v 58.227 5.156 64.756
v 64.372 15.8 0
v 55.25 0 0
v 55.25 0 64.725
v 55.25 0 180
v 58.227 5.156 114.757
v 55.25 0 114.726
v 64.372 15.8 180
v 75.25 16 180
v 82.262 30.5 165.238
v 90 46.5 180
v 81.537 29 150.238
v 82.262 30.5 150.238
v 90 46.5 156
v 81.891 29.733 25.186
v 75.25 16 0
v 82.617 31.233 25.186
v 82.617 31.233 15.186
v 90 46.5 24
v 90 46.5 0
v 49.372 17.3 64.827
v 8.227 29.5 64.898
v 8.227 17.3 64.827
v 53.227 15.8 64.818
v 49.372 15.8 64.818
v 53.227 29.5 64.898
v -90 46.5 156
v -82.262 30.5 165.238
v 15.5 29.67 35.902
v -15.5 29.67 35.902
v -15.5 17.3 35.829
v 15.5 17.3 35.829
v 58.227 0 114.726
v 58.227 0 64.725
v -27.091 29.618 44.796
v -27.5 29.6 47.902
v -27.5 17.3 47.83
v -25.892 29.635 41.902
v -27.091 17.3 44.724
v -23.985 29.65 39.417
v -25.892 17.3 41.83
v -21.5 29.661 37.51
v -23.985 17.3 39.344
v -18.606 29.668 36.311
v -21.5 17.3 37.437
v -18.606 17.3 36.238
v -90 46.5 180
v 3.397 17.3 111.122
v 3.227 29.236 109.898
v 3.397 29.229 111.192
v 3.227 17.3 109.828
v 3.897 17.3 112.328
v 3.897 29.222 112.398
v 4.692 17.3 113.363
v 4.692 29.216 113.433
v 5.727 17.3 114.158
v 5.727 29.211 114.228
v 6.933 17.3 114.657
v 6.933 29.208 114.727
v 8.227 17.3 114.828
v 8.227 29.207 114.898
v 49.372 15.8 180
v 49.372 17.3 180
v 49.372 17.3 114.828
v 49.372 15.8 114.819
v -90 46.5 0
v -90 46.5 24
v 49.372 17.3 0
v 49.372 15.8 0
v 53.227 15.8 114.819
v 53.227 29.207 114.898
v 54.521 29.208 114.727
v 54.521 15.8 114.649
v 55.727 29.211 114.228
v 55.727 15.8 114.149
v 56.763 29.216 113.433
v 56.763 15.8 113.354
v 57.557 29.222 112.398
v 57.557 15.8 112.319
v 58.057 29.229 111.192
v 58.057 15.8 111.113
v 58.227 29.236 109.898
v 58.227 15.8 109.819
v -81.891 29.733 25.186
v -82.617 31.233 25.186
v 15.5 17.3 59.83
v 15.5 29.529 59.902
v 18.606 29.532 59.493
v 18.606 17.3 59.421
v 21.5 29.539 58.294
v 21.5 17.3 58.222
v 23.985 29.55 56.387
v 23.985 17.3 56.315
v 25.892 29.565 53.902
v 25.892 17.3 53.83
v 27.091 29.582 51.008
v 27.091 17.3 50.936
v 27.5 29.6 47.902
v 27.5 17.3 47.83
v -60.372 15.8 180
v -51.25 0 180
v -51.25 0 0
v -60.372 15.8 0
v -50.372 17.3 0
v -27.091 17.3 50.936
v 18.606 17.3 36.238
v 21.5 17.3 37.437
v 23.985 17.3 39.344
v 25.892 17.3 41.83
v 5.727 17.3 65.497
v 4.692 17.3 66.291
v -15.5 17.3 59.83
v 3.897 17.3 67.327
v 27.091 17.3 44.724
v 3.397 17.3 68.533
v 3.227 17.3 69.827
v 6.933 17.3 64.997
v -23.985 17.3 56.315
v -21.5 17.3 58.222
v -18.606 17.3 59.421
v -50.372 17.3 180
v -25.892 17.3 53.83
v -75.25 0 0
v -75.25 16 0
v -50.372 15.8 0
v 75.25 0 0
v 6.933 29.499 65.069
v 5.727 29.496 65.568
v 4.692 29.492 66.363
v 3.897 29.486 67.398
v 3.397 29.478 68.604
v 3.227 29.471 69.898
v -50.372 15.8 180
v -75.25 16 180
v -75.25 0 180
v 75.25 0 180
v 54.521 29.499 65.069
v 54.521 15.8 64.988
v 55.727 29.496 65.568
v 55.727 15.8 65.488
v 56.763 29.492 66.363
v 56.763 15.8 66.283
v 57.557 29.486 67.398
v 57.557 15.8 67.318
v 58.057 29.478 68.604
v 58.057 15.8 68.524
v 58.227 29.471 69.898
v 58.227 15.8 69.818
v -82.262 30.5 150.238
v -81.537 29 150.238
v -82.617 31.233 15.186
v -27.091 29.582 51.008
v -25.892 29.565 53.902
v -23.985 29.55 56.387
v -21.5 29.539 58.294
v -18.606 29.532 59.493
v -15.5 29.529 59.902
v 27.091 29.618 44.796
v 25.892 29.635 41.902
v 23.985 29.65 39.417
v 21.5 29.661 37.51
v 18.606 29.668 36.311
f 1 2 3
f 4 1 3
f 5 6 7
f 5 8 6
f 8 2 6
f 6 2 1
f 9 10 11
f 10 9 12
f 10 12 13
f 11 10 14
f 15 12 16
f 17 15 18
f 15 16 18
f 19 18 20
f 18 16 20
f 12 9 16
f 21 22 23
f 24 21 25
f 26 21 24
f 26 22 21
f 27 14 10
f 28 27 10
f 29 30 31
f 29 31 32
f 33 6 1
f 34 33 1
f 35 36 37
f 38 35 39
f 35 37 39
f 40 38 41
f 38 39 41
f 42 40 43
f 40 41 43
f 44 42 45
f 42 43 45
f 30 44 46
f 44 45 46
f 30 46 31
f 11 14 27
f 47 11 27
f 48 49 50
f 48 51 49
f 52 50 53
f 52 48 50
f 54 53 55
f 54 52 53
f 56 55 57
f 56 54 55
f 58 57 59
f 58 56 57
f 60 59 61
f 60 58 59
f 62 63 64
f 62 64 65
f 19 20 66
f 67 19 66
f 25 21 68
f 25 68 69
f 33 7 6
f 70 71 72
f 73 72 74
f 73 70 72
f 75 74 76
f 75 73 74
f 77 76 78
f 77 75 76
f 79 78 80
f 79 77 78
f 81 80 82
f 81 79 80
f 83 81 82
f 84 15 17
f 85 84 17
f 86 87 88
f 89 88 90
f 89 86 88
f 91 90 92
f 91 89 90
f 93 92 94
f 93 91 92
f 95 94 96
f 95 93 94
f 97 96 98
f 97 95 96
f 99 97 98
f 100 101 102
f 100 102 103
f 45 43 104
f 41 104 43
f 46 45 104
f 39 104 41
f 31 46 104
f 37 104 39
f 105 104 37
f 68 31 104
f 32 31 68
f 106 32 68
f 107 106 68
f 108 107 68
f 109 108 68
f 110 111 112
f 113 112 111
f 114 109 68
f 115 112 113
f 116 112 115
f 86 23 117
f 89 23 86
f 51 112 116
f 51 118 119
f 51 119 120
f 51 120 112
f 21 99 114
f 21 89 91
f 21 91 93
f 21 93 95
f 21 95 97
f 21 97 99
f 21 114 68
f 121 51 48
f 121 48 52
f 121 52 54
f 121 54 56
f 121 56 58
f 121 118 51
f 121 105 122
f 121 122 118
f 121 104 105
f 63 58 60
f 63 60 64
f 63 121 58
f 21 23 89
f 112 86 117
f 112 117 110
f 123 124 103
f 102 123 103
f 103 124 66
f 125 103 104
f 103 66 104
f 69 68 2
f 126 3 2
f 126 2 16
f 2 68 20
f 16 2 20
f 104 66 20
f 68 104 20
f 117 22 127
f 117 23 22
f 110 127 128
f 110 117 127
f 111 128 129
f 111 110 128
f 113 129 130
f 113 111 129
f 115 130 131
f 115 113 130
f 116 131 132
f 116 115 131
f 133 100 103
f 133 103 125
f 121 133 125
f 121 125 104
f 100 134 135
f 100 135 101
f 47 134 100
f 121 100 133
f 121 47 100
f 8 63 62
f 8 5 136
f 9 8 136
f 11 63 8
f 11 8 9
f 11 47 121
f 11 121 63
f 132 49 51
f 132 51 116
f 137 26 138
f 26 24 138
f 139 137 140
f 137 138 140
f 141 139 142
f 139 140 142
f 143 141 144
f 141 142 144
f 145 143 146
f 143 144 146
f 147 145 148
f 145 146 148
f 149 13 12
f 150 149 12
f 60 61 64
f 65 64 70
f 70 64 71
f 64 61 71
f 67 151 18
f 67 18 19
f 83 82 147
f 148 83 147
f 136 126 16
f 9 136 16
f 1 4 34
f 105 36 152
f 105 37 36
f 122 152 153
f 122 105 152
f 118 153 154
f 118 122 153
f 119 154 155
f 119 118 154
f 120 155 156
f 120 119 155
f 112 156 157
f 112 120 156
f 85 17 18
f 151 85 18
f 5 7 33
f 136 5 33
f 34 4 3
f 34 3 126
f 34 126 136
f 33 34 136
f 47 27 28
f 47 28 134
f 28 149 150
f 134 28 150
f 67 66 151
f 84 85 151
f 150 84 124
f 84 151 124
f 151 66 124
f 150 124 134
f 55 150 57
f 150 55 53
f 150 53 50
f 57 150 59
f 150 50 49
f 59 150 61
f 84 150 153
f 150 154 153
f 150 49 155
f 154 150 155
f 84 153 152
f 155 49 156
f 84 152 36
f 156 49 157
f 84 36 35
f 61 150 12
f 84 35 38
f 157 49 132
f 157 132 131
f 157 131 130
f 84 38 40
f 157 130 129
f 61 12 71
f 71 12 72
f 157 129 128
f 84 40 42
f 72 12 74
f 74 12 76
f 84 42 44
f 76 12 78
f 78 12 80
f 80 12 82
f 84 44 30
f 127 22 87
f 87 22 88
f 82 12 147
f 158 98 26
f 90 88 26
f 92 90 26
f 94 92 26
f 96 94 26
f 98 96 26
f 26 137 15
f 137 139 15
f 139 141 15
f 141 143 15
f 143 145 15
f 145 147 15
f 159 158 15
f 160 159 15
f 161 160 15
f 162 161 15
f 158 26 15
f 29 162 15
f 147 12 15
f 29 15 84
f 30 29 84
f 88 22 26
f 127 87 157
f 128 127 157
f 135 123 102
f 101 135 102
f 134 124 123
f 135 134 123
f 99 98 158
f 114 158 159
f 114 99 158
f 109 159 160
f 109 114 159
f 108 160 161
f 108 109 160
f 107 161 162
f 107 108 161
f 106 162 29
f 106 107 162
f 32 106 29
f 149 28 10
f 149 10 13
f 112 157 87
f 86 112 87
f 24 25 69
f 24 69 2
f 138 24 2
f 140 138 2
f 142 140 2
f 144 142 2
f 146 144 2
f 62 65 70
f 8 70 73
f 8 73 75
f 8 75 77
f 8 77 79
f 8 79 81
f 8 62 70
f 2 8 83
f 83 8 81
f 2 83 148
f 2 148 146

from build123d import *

# Parameters (mm, degrees)
BOSS_EXTRUDE1_DEPTH = 180
CUT_EXTRUDE1_DEPTH  = 207.548420473
BOSS_EXTRUDE2_DEPTH = 175
CUT_EXTRUDE5_DEPTH  = 180
CUT_EXTRUDE6_DEPTH  = 180
SKETCH7_W           = 55
SKETCH7_H           = 24
CUT_EXTRUDE7_DEPTH  = 180
SKETCH8_W           = 55
SKETCH8_H           = 50
CUT_EXTRUDE8_DEPTH  = 180
FILLET1_R           = 12
FILLET2_R           = 12
FILLET3_R           = 12
FILLET4_R           = 12
FILLET5_R           = 5
FILLET6_R           = 5
FILLET7_R           = 5
FILLET8_R           = 5


with BuildPart() as part:
    # Sketch1 → Boss-Extrude1 (new body)
    with BuildSketch(Plane.XY):
        Polygon((-75.25, 0), (75.25, 0), (75.25, 16), (90, 46.5), (-90, 46.5), (-75.25, 16), align=None)
    extrude(amount=BOSS_EXTRUDE1_DEPTH)

    # Sketch2 → Cut-Extrude1 (cut, through all)
    with BuildSketch(Plane.XY.offset(180)):
        Polygon((-51.25, 0), (-60.372134253, 15.8), (-50.372134253, 15.8), (-50.372134253, 17.3), (49.372134253, 17.3), (49.372134253, 15.8), (64.372134253, 15.8), (55.25, 0), align=None)
    extrude(amount=-CUT_EXTRUDE1_DEPTH, mode=Mode.SUBTRACT)


with BuildPart() as body_2:
    # Sketch3 → Boss-Extrude2 (new body)
    with BuildSketch(Plane.XY.offset(180)):
        Polygon((90, 46.5), (75.25, 16), (90, 16), align=None)
    extrude(amount=-BOSS_EXTRUDE2_DEPTH)


with BuildPart() as cut_extrude5_tool:
    # Sketch5 → Cut-Extrude5 (new body)
    with BuildSketch(Plane(origin=(90, 0, 0), x_dir=(0, 0, -1), z_dir=(1, 0, 0))):
        Polygon((-156, 46.5), (-165.237604307, 30.5), (-150.237604307, 30.5), (-150.237604307, 29), (-25.18556724, 29.732954619), (-25.18556724, 31.232954619), (-15.18556724, 31.232954619), (-24, 46.5), align=None)
    extrude(amount=-CUT_EXTRUDE5_DEPTH)


with BuildPart() as part_1:
    add(part.part)

    # Cut-Extrude5: cut by cut_extrude5_tool
    add(cut_extrude5_tool.part, mode=Mode.SUBTRACT)

    # Sketch7 → Cut-Extrude7 (cut)
    with BuildSketch(Plane(origin=(0, 29.879545719, 0.175129902), x_dir=(1, 0, 0), z_dir=(0, 0.9999828236276607, 0.005861096284045548))):
        with Locations((0, -47.727459023)):
            Rectangle(SKETCH7_W, SKETCH7_H)
    extrude(amount=-CUT_EXTRUDE7_DEPTH, mode=Mode.SUBTRACT)

    # Sketch8 → Cut-Extrude8 (cut)
    with BuildSketch(Plane(origin=(0, 29.879545719, 0.175129902), x_dir=(1, 0, 0), z_dir=(0, 0.9999828236276607, 0.005861096284045548))):
        with Locations((30.72704543, -89.724367276)):
            Rectangle(SKETCH8_W, SKETCH8_H)
    extrude(amount=-CUT_EXTRUDE8_DEPTH, mode=Mode.SUBTRACT)

    # Fillet1
    fillet1_edges = [part_1.edges().sort_by_distance(p)[0] for p in [
        (-27.5, 23.414738665, 59.865723337),
    ]]
    fillet(fillet1_edges, radius=FILLET1_R)

    # Fillet2
    fillet2_edges = [part_1.edges().sort_by_distance(p)[0] for p in [
        (-27.5, 23.485071821, 35.865723333),
    ]]
    fillet(fillet2_edges, radius=FILLET2_R - 0.0001)  # a hair under: the kernel refuses the full size

    # Fillet3
    fillet3_edges = [part_1.edges().sort_by_distance(p)[0] for p in [
        (27.5, 23.414738665, 59.865723337),
    ]]
    fillet(fillet3_edges, radius=FILLET3_R)

    # Fillet4
    fillet4_edges = [part_1.edges().sort_by_distance(p)[0] for p in [
        (27.5, 23.485071821, 35.865723333),
    ]]
    fillet(fillet4_edges, radius=FILLET4_R - 0.0001)  # a hair under: the kernel refuses the full size

    # Fillet5
    fillet5_edges = [part_1.edges().sort_by_distance(p)[0] for p in [
        (58.22704543, 22.650094985, 64.858235693),
    ]]
    fillet(fillet5_edges, radius=FILLET5_R)

    # Fillet6
    fillet6_edges = [part_1.edges().sort_by_distance(p)[0] for p in [
        (3.22704543, 23.400094985, 64.86263159),
    ]]
    fillet(fillet6_edges, radius=FILLET6_R)

    # Fillet7
    fillet7_edges = [part_1.edges().sort_by_distance(p)[0] for p in [
        (3.22704543, 23.253567578, 114.862631598),
    ]]
    fillet(fillet7_edges, radius=FILLET7_R)

    # Fillet8
    fillet8_edges = [part_1.edges().sort_by_distance(p)[0] for p in [
        (58.22704543, 22.503567578, 114.8582357),
    ]]
    fillet(fillet8_edges, radius=FILLET8_R)


with BuildPart() as body_2_1:
    add(body_2.part)

    # Cut-Extrude5: cut by cut_extrude5_tool
    add(cut_extrude5_tool.part, mode=Mode.SUBTRACT)

    # Sketch6 → Cut-Extrude6 (cut)
    with BuildSketch(Plane.XY.offset(180)):
        Polygon((75.25, 16), (90, 46.5), (90, 16), align=None)
    extrude(amount=-CUT_EXTRUDE6_DEPTH, mode=Mode.SUBTRACT)


solid = part_1.part
